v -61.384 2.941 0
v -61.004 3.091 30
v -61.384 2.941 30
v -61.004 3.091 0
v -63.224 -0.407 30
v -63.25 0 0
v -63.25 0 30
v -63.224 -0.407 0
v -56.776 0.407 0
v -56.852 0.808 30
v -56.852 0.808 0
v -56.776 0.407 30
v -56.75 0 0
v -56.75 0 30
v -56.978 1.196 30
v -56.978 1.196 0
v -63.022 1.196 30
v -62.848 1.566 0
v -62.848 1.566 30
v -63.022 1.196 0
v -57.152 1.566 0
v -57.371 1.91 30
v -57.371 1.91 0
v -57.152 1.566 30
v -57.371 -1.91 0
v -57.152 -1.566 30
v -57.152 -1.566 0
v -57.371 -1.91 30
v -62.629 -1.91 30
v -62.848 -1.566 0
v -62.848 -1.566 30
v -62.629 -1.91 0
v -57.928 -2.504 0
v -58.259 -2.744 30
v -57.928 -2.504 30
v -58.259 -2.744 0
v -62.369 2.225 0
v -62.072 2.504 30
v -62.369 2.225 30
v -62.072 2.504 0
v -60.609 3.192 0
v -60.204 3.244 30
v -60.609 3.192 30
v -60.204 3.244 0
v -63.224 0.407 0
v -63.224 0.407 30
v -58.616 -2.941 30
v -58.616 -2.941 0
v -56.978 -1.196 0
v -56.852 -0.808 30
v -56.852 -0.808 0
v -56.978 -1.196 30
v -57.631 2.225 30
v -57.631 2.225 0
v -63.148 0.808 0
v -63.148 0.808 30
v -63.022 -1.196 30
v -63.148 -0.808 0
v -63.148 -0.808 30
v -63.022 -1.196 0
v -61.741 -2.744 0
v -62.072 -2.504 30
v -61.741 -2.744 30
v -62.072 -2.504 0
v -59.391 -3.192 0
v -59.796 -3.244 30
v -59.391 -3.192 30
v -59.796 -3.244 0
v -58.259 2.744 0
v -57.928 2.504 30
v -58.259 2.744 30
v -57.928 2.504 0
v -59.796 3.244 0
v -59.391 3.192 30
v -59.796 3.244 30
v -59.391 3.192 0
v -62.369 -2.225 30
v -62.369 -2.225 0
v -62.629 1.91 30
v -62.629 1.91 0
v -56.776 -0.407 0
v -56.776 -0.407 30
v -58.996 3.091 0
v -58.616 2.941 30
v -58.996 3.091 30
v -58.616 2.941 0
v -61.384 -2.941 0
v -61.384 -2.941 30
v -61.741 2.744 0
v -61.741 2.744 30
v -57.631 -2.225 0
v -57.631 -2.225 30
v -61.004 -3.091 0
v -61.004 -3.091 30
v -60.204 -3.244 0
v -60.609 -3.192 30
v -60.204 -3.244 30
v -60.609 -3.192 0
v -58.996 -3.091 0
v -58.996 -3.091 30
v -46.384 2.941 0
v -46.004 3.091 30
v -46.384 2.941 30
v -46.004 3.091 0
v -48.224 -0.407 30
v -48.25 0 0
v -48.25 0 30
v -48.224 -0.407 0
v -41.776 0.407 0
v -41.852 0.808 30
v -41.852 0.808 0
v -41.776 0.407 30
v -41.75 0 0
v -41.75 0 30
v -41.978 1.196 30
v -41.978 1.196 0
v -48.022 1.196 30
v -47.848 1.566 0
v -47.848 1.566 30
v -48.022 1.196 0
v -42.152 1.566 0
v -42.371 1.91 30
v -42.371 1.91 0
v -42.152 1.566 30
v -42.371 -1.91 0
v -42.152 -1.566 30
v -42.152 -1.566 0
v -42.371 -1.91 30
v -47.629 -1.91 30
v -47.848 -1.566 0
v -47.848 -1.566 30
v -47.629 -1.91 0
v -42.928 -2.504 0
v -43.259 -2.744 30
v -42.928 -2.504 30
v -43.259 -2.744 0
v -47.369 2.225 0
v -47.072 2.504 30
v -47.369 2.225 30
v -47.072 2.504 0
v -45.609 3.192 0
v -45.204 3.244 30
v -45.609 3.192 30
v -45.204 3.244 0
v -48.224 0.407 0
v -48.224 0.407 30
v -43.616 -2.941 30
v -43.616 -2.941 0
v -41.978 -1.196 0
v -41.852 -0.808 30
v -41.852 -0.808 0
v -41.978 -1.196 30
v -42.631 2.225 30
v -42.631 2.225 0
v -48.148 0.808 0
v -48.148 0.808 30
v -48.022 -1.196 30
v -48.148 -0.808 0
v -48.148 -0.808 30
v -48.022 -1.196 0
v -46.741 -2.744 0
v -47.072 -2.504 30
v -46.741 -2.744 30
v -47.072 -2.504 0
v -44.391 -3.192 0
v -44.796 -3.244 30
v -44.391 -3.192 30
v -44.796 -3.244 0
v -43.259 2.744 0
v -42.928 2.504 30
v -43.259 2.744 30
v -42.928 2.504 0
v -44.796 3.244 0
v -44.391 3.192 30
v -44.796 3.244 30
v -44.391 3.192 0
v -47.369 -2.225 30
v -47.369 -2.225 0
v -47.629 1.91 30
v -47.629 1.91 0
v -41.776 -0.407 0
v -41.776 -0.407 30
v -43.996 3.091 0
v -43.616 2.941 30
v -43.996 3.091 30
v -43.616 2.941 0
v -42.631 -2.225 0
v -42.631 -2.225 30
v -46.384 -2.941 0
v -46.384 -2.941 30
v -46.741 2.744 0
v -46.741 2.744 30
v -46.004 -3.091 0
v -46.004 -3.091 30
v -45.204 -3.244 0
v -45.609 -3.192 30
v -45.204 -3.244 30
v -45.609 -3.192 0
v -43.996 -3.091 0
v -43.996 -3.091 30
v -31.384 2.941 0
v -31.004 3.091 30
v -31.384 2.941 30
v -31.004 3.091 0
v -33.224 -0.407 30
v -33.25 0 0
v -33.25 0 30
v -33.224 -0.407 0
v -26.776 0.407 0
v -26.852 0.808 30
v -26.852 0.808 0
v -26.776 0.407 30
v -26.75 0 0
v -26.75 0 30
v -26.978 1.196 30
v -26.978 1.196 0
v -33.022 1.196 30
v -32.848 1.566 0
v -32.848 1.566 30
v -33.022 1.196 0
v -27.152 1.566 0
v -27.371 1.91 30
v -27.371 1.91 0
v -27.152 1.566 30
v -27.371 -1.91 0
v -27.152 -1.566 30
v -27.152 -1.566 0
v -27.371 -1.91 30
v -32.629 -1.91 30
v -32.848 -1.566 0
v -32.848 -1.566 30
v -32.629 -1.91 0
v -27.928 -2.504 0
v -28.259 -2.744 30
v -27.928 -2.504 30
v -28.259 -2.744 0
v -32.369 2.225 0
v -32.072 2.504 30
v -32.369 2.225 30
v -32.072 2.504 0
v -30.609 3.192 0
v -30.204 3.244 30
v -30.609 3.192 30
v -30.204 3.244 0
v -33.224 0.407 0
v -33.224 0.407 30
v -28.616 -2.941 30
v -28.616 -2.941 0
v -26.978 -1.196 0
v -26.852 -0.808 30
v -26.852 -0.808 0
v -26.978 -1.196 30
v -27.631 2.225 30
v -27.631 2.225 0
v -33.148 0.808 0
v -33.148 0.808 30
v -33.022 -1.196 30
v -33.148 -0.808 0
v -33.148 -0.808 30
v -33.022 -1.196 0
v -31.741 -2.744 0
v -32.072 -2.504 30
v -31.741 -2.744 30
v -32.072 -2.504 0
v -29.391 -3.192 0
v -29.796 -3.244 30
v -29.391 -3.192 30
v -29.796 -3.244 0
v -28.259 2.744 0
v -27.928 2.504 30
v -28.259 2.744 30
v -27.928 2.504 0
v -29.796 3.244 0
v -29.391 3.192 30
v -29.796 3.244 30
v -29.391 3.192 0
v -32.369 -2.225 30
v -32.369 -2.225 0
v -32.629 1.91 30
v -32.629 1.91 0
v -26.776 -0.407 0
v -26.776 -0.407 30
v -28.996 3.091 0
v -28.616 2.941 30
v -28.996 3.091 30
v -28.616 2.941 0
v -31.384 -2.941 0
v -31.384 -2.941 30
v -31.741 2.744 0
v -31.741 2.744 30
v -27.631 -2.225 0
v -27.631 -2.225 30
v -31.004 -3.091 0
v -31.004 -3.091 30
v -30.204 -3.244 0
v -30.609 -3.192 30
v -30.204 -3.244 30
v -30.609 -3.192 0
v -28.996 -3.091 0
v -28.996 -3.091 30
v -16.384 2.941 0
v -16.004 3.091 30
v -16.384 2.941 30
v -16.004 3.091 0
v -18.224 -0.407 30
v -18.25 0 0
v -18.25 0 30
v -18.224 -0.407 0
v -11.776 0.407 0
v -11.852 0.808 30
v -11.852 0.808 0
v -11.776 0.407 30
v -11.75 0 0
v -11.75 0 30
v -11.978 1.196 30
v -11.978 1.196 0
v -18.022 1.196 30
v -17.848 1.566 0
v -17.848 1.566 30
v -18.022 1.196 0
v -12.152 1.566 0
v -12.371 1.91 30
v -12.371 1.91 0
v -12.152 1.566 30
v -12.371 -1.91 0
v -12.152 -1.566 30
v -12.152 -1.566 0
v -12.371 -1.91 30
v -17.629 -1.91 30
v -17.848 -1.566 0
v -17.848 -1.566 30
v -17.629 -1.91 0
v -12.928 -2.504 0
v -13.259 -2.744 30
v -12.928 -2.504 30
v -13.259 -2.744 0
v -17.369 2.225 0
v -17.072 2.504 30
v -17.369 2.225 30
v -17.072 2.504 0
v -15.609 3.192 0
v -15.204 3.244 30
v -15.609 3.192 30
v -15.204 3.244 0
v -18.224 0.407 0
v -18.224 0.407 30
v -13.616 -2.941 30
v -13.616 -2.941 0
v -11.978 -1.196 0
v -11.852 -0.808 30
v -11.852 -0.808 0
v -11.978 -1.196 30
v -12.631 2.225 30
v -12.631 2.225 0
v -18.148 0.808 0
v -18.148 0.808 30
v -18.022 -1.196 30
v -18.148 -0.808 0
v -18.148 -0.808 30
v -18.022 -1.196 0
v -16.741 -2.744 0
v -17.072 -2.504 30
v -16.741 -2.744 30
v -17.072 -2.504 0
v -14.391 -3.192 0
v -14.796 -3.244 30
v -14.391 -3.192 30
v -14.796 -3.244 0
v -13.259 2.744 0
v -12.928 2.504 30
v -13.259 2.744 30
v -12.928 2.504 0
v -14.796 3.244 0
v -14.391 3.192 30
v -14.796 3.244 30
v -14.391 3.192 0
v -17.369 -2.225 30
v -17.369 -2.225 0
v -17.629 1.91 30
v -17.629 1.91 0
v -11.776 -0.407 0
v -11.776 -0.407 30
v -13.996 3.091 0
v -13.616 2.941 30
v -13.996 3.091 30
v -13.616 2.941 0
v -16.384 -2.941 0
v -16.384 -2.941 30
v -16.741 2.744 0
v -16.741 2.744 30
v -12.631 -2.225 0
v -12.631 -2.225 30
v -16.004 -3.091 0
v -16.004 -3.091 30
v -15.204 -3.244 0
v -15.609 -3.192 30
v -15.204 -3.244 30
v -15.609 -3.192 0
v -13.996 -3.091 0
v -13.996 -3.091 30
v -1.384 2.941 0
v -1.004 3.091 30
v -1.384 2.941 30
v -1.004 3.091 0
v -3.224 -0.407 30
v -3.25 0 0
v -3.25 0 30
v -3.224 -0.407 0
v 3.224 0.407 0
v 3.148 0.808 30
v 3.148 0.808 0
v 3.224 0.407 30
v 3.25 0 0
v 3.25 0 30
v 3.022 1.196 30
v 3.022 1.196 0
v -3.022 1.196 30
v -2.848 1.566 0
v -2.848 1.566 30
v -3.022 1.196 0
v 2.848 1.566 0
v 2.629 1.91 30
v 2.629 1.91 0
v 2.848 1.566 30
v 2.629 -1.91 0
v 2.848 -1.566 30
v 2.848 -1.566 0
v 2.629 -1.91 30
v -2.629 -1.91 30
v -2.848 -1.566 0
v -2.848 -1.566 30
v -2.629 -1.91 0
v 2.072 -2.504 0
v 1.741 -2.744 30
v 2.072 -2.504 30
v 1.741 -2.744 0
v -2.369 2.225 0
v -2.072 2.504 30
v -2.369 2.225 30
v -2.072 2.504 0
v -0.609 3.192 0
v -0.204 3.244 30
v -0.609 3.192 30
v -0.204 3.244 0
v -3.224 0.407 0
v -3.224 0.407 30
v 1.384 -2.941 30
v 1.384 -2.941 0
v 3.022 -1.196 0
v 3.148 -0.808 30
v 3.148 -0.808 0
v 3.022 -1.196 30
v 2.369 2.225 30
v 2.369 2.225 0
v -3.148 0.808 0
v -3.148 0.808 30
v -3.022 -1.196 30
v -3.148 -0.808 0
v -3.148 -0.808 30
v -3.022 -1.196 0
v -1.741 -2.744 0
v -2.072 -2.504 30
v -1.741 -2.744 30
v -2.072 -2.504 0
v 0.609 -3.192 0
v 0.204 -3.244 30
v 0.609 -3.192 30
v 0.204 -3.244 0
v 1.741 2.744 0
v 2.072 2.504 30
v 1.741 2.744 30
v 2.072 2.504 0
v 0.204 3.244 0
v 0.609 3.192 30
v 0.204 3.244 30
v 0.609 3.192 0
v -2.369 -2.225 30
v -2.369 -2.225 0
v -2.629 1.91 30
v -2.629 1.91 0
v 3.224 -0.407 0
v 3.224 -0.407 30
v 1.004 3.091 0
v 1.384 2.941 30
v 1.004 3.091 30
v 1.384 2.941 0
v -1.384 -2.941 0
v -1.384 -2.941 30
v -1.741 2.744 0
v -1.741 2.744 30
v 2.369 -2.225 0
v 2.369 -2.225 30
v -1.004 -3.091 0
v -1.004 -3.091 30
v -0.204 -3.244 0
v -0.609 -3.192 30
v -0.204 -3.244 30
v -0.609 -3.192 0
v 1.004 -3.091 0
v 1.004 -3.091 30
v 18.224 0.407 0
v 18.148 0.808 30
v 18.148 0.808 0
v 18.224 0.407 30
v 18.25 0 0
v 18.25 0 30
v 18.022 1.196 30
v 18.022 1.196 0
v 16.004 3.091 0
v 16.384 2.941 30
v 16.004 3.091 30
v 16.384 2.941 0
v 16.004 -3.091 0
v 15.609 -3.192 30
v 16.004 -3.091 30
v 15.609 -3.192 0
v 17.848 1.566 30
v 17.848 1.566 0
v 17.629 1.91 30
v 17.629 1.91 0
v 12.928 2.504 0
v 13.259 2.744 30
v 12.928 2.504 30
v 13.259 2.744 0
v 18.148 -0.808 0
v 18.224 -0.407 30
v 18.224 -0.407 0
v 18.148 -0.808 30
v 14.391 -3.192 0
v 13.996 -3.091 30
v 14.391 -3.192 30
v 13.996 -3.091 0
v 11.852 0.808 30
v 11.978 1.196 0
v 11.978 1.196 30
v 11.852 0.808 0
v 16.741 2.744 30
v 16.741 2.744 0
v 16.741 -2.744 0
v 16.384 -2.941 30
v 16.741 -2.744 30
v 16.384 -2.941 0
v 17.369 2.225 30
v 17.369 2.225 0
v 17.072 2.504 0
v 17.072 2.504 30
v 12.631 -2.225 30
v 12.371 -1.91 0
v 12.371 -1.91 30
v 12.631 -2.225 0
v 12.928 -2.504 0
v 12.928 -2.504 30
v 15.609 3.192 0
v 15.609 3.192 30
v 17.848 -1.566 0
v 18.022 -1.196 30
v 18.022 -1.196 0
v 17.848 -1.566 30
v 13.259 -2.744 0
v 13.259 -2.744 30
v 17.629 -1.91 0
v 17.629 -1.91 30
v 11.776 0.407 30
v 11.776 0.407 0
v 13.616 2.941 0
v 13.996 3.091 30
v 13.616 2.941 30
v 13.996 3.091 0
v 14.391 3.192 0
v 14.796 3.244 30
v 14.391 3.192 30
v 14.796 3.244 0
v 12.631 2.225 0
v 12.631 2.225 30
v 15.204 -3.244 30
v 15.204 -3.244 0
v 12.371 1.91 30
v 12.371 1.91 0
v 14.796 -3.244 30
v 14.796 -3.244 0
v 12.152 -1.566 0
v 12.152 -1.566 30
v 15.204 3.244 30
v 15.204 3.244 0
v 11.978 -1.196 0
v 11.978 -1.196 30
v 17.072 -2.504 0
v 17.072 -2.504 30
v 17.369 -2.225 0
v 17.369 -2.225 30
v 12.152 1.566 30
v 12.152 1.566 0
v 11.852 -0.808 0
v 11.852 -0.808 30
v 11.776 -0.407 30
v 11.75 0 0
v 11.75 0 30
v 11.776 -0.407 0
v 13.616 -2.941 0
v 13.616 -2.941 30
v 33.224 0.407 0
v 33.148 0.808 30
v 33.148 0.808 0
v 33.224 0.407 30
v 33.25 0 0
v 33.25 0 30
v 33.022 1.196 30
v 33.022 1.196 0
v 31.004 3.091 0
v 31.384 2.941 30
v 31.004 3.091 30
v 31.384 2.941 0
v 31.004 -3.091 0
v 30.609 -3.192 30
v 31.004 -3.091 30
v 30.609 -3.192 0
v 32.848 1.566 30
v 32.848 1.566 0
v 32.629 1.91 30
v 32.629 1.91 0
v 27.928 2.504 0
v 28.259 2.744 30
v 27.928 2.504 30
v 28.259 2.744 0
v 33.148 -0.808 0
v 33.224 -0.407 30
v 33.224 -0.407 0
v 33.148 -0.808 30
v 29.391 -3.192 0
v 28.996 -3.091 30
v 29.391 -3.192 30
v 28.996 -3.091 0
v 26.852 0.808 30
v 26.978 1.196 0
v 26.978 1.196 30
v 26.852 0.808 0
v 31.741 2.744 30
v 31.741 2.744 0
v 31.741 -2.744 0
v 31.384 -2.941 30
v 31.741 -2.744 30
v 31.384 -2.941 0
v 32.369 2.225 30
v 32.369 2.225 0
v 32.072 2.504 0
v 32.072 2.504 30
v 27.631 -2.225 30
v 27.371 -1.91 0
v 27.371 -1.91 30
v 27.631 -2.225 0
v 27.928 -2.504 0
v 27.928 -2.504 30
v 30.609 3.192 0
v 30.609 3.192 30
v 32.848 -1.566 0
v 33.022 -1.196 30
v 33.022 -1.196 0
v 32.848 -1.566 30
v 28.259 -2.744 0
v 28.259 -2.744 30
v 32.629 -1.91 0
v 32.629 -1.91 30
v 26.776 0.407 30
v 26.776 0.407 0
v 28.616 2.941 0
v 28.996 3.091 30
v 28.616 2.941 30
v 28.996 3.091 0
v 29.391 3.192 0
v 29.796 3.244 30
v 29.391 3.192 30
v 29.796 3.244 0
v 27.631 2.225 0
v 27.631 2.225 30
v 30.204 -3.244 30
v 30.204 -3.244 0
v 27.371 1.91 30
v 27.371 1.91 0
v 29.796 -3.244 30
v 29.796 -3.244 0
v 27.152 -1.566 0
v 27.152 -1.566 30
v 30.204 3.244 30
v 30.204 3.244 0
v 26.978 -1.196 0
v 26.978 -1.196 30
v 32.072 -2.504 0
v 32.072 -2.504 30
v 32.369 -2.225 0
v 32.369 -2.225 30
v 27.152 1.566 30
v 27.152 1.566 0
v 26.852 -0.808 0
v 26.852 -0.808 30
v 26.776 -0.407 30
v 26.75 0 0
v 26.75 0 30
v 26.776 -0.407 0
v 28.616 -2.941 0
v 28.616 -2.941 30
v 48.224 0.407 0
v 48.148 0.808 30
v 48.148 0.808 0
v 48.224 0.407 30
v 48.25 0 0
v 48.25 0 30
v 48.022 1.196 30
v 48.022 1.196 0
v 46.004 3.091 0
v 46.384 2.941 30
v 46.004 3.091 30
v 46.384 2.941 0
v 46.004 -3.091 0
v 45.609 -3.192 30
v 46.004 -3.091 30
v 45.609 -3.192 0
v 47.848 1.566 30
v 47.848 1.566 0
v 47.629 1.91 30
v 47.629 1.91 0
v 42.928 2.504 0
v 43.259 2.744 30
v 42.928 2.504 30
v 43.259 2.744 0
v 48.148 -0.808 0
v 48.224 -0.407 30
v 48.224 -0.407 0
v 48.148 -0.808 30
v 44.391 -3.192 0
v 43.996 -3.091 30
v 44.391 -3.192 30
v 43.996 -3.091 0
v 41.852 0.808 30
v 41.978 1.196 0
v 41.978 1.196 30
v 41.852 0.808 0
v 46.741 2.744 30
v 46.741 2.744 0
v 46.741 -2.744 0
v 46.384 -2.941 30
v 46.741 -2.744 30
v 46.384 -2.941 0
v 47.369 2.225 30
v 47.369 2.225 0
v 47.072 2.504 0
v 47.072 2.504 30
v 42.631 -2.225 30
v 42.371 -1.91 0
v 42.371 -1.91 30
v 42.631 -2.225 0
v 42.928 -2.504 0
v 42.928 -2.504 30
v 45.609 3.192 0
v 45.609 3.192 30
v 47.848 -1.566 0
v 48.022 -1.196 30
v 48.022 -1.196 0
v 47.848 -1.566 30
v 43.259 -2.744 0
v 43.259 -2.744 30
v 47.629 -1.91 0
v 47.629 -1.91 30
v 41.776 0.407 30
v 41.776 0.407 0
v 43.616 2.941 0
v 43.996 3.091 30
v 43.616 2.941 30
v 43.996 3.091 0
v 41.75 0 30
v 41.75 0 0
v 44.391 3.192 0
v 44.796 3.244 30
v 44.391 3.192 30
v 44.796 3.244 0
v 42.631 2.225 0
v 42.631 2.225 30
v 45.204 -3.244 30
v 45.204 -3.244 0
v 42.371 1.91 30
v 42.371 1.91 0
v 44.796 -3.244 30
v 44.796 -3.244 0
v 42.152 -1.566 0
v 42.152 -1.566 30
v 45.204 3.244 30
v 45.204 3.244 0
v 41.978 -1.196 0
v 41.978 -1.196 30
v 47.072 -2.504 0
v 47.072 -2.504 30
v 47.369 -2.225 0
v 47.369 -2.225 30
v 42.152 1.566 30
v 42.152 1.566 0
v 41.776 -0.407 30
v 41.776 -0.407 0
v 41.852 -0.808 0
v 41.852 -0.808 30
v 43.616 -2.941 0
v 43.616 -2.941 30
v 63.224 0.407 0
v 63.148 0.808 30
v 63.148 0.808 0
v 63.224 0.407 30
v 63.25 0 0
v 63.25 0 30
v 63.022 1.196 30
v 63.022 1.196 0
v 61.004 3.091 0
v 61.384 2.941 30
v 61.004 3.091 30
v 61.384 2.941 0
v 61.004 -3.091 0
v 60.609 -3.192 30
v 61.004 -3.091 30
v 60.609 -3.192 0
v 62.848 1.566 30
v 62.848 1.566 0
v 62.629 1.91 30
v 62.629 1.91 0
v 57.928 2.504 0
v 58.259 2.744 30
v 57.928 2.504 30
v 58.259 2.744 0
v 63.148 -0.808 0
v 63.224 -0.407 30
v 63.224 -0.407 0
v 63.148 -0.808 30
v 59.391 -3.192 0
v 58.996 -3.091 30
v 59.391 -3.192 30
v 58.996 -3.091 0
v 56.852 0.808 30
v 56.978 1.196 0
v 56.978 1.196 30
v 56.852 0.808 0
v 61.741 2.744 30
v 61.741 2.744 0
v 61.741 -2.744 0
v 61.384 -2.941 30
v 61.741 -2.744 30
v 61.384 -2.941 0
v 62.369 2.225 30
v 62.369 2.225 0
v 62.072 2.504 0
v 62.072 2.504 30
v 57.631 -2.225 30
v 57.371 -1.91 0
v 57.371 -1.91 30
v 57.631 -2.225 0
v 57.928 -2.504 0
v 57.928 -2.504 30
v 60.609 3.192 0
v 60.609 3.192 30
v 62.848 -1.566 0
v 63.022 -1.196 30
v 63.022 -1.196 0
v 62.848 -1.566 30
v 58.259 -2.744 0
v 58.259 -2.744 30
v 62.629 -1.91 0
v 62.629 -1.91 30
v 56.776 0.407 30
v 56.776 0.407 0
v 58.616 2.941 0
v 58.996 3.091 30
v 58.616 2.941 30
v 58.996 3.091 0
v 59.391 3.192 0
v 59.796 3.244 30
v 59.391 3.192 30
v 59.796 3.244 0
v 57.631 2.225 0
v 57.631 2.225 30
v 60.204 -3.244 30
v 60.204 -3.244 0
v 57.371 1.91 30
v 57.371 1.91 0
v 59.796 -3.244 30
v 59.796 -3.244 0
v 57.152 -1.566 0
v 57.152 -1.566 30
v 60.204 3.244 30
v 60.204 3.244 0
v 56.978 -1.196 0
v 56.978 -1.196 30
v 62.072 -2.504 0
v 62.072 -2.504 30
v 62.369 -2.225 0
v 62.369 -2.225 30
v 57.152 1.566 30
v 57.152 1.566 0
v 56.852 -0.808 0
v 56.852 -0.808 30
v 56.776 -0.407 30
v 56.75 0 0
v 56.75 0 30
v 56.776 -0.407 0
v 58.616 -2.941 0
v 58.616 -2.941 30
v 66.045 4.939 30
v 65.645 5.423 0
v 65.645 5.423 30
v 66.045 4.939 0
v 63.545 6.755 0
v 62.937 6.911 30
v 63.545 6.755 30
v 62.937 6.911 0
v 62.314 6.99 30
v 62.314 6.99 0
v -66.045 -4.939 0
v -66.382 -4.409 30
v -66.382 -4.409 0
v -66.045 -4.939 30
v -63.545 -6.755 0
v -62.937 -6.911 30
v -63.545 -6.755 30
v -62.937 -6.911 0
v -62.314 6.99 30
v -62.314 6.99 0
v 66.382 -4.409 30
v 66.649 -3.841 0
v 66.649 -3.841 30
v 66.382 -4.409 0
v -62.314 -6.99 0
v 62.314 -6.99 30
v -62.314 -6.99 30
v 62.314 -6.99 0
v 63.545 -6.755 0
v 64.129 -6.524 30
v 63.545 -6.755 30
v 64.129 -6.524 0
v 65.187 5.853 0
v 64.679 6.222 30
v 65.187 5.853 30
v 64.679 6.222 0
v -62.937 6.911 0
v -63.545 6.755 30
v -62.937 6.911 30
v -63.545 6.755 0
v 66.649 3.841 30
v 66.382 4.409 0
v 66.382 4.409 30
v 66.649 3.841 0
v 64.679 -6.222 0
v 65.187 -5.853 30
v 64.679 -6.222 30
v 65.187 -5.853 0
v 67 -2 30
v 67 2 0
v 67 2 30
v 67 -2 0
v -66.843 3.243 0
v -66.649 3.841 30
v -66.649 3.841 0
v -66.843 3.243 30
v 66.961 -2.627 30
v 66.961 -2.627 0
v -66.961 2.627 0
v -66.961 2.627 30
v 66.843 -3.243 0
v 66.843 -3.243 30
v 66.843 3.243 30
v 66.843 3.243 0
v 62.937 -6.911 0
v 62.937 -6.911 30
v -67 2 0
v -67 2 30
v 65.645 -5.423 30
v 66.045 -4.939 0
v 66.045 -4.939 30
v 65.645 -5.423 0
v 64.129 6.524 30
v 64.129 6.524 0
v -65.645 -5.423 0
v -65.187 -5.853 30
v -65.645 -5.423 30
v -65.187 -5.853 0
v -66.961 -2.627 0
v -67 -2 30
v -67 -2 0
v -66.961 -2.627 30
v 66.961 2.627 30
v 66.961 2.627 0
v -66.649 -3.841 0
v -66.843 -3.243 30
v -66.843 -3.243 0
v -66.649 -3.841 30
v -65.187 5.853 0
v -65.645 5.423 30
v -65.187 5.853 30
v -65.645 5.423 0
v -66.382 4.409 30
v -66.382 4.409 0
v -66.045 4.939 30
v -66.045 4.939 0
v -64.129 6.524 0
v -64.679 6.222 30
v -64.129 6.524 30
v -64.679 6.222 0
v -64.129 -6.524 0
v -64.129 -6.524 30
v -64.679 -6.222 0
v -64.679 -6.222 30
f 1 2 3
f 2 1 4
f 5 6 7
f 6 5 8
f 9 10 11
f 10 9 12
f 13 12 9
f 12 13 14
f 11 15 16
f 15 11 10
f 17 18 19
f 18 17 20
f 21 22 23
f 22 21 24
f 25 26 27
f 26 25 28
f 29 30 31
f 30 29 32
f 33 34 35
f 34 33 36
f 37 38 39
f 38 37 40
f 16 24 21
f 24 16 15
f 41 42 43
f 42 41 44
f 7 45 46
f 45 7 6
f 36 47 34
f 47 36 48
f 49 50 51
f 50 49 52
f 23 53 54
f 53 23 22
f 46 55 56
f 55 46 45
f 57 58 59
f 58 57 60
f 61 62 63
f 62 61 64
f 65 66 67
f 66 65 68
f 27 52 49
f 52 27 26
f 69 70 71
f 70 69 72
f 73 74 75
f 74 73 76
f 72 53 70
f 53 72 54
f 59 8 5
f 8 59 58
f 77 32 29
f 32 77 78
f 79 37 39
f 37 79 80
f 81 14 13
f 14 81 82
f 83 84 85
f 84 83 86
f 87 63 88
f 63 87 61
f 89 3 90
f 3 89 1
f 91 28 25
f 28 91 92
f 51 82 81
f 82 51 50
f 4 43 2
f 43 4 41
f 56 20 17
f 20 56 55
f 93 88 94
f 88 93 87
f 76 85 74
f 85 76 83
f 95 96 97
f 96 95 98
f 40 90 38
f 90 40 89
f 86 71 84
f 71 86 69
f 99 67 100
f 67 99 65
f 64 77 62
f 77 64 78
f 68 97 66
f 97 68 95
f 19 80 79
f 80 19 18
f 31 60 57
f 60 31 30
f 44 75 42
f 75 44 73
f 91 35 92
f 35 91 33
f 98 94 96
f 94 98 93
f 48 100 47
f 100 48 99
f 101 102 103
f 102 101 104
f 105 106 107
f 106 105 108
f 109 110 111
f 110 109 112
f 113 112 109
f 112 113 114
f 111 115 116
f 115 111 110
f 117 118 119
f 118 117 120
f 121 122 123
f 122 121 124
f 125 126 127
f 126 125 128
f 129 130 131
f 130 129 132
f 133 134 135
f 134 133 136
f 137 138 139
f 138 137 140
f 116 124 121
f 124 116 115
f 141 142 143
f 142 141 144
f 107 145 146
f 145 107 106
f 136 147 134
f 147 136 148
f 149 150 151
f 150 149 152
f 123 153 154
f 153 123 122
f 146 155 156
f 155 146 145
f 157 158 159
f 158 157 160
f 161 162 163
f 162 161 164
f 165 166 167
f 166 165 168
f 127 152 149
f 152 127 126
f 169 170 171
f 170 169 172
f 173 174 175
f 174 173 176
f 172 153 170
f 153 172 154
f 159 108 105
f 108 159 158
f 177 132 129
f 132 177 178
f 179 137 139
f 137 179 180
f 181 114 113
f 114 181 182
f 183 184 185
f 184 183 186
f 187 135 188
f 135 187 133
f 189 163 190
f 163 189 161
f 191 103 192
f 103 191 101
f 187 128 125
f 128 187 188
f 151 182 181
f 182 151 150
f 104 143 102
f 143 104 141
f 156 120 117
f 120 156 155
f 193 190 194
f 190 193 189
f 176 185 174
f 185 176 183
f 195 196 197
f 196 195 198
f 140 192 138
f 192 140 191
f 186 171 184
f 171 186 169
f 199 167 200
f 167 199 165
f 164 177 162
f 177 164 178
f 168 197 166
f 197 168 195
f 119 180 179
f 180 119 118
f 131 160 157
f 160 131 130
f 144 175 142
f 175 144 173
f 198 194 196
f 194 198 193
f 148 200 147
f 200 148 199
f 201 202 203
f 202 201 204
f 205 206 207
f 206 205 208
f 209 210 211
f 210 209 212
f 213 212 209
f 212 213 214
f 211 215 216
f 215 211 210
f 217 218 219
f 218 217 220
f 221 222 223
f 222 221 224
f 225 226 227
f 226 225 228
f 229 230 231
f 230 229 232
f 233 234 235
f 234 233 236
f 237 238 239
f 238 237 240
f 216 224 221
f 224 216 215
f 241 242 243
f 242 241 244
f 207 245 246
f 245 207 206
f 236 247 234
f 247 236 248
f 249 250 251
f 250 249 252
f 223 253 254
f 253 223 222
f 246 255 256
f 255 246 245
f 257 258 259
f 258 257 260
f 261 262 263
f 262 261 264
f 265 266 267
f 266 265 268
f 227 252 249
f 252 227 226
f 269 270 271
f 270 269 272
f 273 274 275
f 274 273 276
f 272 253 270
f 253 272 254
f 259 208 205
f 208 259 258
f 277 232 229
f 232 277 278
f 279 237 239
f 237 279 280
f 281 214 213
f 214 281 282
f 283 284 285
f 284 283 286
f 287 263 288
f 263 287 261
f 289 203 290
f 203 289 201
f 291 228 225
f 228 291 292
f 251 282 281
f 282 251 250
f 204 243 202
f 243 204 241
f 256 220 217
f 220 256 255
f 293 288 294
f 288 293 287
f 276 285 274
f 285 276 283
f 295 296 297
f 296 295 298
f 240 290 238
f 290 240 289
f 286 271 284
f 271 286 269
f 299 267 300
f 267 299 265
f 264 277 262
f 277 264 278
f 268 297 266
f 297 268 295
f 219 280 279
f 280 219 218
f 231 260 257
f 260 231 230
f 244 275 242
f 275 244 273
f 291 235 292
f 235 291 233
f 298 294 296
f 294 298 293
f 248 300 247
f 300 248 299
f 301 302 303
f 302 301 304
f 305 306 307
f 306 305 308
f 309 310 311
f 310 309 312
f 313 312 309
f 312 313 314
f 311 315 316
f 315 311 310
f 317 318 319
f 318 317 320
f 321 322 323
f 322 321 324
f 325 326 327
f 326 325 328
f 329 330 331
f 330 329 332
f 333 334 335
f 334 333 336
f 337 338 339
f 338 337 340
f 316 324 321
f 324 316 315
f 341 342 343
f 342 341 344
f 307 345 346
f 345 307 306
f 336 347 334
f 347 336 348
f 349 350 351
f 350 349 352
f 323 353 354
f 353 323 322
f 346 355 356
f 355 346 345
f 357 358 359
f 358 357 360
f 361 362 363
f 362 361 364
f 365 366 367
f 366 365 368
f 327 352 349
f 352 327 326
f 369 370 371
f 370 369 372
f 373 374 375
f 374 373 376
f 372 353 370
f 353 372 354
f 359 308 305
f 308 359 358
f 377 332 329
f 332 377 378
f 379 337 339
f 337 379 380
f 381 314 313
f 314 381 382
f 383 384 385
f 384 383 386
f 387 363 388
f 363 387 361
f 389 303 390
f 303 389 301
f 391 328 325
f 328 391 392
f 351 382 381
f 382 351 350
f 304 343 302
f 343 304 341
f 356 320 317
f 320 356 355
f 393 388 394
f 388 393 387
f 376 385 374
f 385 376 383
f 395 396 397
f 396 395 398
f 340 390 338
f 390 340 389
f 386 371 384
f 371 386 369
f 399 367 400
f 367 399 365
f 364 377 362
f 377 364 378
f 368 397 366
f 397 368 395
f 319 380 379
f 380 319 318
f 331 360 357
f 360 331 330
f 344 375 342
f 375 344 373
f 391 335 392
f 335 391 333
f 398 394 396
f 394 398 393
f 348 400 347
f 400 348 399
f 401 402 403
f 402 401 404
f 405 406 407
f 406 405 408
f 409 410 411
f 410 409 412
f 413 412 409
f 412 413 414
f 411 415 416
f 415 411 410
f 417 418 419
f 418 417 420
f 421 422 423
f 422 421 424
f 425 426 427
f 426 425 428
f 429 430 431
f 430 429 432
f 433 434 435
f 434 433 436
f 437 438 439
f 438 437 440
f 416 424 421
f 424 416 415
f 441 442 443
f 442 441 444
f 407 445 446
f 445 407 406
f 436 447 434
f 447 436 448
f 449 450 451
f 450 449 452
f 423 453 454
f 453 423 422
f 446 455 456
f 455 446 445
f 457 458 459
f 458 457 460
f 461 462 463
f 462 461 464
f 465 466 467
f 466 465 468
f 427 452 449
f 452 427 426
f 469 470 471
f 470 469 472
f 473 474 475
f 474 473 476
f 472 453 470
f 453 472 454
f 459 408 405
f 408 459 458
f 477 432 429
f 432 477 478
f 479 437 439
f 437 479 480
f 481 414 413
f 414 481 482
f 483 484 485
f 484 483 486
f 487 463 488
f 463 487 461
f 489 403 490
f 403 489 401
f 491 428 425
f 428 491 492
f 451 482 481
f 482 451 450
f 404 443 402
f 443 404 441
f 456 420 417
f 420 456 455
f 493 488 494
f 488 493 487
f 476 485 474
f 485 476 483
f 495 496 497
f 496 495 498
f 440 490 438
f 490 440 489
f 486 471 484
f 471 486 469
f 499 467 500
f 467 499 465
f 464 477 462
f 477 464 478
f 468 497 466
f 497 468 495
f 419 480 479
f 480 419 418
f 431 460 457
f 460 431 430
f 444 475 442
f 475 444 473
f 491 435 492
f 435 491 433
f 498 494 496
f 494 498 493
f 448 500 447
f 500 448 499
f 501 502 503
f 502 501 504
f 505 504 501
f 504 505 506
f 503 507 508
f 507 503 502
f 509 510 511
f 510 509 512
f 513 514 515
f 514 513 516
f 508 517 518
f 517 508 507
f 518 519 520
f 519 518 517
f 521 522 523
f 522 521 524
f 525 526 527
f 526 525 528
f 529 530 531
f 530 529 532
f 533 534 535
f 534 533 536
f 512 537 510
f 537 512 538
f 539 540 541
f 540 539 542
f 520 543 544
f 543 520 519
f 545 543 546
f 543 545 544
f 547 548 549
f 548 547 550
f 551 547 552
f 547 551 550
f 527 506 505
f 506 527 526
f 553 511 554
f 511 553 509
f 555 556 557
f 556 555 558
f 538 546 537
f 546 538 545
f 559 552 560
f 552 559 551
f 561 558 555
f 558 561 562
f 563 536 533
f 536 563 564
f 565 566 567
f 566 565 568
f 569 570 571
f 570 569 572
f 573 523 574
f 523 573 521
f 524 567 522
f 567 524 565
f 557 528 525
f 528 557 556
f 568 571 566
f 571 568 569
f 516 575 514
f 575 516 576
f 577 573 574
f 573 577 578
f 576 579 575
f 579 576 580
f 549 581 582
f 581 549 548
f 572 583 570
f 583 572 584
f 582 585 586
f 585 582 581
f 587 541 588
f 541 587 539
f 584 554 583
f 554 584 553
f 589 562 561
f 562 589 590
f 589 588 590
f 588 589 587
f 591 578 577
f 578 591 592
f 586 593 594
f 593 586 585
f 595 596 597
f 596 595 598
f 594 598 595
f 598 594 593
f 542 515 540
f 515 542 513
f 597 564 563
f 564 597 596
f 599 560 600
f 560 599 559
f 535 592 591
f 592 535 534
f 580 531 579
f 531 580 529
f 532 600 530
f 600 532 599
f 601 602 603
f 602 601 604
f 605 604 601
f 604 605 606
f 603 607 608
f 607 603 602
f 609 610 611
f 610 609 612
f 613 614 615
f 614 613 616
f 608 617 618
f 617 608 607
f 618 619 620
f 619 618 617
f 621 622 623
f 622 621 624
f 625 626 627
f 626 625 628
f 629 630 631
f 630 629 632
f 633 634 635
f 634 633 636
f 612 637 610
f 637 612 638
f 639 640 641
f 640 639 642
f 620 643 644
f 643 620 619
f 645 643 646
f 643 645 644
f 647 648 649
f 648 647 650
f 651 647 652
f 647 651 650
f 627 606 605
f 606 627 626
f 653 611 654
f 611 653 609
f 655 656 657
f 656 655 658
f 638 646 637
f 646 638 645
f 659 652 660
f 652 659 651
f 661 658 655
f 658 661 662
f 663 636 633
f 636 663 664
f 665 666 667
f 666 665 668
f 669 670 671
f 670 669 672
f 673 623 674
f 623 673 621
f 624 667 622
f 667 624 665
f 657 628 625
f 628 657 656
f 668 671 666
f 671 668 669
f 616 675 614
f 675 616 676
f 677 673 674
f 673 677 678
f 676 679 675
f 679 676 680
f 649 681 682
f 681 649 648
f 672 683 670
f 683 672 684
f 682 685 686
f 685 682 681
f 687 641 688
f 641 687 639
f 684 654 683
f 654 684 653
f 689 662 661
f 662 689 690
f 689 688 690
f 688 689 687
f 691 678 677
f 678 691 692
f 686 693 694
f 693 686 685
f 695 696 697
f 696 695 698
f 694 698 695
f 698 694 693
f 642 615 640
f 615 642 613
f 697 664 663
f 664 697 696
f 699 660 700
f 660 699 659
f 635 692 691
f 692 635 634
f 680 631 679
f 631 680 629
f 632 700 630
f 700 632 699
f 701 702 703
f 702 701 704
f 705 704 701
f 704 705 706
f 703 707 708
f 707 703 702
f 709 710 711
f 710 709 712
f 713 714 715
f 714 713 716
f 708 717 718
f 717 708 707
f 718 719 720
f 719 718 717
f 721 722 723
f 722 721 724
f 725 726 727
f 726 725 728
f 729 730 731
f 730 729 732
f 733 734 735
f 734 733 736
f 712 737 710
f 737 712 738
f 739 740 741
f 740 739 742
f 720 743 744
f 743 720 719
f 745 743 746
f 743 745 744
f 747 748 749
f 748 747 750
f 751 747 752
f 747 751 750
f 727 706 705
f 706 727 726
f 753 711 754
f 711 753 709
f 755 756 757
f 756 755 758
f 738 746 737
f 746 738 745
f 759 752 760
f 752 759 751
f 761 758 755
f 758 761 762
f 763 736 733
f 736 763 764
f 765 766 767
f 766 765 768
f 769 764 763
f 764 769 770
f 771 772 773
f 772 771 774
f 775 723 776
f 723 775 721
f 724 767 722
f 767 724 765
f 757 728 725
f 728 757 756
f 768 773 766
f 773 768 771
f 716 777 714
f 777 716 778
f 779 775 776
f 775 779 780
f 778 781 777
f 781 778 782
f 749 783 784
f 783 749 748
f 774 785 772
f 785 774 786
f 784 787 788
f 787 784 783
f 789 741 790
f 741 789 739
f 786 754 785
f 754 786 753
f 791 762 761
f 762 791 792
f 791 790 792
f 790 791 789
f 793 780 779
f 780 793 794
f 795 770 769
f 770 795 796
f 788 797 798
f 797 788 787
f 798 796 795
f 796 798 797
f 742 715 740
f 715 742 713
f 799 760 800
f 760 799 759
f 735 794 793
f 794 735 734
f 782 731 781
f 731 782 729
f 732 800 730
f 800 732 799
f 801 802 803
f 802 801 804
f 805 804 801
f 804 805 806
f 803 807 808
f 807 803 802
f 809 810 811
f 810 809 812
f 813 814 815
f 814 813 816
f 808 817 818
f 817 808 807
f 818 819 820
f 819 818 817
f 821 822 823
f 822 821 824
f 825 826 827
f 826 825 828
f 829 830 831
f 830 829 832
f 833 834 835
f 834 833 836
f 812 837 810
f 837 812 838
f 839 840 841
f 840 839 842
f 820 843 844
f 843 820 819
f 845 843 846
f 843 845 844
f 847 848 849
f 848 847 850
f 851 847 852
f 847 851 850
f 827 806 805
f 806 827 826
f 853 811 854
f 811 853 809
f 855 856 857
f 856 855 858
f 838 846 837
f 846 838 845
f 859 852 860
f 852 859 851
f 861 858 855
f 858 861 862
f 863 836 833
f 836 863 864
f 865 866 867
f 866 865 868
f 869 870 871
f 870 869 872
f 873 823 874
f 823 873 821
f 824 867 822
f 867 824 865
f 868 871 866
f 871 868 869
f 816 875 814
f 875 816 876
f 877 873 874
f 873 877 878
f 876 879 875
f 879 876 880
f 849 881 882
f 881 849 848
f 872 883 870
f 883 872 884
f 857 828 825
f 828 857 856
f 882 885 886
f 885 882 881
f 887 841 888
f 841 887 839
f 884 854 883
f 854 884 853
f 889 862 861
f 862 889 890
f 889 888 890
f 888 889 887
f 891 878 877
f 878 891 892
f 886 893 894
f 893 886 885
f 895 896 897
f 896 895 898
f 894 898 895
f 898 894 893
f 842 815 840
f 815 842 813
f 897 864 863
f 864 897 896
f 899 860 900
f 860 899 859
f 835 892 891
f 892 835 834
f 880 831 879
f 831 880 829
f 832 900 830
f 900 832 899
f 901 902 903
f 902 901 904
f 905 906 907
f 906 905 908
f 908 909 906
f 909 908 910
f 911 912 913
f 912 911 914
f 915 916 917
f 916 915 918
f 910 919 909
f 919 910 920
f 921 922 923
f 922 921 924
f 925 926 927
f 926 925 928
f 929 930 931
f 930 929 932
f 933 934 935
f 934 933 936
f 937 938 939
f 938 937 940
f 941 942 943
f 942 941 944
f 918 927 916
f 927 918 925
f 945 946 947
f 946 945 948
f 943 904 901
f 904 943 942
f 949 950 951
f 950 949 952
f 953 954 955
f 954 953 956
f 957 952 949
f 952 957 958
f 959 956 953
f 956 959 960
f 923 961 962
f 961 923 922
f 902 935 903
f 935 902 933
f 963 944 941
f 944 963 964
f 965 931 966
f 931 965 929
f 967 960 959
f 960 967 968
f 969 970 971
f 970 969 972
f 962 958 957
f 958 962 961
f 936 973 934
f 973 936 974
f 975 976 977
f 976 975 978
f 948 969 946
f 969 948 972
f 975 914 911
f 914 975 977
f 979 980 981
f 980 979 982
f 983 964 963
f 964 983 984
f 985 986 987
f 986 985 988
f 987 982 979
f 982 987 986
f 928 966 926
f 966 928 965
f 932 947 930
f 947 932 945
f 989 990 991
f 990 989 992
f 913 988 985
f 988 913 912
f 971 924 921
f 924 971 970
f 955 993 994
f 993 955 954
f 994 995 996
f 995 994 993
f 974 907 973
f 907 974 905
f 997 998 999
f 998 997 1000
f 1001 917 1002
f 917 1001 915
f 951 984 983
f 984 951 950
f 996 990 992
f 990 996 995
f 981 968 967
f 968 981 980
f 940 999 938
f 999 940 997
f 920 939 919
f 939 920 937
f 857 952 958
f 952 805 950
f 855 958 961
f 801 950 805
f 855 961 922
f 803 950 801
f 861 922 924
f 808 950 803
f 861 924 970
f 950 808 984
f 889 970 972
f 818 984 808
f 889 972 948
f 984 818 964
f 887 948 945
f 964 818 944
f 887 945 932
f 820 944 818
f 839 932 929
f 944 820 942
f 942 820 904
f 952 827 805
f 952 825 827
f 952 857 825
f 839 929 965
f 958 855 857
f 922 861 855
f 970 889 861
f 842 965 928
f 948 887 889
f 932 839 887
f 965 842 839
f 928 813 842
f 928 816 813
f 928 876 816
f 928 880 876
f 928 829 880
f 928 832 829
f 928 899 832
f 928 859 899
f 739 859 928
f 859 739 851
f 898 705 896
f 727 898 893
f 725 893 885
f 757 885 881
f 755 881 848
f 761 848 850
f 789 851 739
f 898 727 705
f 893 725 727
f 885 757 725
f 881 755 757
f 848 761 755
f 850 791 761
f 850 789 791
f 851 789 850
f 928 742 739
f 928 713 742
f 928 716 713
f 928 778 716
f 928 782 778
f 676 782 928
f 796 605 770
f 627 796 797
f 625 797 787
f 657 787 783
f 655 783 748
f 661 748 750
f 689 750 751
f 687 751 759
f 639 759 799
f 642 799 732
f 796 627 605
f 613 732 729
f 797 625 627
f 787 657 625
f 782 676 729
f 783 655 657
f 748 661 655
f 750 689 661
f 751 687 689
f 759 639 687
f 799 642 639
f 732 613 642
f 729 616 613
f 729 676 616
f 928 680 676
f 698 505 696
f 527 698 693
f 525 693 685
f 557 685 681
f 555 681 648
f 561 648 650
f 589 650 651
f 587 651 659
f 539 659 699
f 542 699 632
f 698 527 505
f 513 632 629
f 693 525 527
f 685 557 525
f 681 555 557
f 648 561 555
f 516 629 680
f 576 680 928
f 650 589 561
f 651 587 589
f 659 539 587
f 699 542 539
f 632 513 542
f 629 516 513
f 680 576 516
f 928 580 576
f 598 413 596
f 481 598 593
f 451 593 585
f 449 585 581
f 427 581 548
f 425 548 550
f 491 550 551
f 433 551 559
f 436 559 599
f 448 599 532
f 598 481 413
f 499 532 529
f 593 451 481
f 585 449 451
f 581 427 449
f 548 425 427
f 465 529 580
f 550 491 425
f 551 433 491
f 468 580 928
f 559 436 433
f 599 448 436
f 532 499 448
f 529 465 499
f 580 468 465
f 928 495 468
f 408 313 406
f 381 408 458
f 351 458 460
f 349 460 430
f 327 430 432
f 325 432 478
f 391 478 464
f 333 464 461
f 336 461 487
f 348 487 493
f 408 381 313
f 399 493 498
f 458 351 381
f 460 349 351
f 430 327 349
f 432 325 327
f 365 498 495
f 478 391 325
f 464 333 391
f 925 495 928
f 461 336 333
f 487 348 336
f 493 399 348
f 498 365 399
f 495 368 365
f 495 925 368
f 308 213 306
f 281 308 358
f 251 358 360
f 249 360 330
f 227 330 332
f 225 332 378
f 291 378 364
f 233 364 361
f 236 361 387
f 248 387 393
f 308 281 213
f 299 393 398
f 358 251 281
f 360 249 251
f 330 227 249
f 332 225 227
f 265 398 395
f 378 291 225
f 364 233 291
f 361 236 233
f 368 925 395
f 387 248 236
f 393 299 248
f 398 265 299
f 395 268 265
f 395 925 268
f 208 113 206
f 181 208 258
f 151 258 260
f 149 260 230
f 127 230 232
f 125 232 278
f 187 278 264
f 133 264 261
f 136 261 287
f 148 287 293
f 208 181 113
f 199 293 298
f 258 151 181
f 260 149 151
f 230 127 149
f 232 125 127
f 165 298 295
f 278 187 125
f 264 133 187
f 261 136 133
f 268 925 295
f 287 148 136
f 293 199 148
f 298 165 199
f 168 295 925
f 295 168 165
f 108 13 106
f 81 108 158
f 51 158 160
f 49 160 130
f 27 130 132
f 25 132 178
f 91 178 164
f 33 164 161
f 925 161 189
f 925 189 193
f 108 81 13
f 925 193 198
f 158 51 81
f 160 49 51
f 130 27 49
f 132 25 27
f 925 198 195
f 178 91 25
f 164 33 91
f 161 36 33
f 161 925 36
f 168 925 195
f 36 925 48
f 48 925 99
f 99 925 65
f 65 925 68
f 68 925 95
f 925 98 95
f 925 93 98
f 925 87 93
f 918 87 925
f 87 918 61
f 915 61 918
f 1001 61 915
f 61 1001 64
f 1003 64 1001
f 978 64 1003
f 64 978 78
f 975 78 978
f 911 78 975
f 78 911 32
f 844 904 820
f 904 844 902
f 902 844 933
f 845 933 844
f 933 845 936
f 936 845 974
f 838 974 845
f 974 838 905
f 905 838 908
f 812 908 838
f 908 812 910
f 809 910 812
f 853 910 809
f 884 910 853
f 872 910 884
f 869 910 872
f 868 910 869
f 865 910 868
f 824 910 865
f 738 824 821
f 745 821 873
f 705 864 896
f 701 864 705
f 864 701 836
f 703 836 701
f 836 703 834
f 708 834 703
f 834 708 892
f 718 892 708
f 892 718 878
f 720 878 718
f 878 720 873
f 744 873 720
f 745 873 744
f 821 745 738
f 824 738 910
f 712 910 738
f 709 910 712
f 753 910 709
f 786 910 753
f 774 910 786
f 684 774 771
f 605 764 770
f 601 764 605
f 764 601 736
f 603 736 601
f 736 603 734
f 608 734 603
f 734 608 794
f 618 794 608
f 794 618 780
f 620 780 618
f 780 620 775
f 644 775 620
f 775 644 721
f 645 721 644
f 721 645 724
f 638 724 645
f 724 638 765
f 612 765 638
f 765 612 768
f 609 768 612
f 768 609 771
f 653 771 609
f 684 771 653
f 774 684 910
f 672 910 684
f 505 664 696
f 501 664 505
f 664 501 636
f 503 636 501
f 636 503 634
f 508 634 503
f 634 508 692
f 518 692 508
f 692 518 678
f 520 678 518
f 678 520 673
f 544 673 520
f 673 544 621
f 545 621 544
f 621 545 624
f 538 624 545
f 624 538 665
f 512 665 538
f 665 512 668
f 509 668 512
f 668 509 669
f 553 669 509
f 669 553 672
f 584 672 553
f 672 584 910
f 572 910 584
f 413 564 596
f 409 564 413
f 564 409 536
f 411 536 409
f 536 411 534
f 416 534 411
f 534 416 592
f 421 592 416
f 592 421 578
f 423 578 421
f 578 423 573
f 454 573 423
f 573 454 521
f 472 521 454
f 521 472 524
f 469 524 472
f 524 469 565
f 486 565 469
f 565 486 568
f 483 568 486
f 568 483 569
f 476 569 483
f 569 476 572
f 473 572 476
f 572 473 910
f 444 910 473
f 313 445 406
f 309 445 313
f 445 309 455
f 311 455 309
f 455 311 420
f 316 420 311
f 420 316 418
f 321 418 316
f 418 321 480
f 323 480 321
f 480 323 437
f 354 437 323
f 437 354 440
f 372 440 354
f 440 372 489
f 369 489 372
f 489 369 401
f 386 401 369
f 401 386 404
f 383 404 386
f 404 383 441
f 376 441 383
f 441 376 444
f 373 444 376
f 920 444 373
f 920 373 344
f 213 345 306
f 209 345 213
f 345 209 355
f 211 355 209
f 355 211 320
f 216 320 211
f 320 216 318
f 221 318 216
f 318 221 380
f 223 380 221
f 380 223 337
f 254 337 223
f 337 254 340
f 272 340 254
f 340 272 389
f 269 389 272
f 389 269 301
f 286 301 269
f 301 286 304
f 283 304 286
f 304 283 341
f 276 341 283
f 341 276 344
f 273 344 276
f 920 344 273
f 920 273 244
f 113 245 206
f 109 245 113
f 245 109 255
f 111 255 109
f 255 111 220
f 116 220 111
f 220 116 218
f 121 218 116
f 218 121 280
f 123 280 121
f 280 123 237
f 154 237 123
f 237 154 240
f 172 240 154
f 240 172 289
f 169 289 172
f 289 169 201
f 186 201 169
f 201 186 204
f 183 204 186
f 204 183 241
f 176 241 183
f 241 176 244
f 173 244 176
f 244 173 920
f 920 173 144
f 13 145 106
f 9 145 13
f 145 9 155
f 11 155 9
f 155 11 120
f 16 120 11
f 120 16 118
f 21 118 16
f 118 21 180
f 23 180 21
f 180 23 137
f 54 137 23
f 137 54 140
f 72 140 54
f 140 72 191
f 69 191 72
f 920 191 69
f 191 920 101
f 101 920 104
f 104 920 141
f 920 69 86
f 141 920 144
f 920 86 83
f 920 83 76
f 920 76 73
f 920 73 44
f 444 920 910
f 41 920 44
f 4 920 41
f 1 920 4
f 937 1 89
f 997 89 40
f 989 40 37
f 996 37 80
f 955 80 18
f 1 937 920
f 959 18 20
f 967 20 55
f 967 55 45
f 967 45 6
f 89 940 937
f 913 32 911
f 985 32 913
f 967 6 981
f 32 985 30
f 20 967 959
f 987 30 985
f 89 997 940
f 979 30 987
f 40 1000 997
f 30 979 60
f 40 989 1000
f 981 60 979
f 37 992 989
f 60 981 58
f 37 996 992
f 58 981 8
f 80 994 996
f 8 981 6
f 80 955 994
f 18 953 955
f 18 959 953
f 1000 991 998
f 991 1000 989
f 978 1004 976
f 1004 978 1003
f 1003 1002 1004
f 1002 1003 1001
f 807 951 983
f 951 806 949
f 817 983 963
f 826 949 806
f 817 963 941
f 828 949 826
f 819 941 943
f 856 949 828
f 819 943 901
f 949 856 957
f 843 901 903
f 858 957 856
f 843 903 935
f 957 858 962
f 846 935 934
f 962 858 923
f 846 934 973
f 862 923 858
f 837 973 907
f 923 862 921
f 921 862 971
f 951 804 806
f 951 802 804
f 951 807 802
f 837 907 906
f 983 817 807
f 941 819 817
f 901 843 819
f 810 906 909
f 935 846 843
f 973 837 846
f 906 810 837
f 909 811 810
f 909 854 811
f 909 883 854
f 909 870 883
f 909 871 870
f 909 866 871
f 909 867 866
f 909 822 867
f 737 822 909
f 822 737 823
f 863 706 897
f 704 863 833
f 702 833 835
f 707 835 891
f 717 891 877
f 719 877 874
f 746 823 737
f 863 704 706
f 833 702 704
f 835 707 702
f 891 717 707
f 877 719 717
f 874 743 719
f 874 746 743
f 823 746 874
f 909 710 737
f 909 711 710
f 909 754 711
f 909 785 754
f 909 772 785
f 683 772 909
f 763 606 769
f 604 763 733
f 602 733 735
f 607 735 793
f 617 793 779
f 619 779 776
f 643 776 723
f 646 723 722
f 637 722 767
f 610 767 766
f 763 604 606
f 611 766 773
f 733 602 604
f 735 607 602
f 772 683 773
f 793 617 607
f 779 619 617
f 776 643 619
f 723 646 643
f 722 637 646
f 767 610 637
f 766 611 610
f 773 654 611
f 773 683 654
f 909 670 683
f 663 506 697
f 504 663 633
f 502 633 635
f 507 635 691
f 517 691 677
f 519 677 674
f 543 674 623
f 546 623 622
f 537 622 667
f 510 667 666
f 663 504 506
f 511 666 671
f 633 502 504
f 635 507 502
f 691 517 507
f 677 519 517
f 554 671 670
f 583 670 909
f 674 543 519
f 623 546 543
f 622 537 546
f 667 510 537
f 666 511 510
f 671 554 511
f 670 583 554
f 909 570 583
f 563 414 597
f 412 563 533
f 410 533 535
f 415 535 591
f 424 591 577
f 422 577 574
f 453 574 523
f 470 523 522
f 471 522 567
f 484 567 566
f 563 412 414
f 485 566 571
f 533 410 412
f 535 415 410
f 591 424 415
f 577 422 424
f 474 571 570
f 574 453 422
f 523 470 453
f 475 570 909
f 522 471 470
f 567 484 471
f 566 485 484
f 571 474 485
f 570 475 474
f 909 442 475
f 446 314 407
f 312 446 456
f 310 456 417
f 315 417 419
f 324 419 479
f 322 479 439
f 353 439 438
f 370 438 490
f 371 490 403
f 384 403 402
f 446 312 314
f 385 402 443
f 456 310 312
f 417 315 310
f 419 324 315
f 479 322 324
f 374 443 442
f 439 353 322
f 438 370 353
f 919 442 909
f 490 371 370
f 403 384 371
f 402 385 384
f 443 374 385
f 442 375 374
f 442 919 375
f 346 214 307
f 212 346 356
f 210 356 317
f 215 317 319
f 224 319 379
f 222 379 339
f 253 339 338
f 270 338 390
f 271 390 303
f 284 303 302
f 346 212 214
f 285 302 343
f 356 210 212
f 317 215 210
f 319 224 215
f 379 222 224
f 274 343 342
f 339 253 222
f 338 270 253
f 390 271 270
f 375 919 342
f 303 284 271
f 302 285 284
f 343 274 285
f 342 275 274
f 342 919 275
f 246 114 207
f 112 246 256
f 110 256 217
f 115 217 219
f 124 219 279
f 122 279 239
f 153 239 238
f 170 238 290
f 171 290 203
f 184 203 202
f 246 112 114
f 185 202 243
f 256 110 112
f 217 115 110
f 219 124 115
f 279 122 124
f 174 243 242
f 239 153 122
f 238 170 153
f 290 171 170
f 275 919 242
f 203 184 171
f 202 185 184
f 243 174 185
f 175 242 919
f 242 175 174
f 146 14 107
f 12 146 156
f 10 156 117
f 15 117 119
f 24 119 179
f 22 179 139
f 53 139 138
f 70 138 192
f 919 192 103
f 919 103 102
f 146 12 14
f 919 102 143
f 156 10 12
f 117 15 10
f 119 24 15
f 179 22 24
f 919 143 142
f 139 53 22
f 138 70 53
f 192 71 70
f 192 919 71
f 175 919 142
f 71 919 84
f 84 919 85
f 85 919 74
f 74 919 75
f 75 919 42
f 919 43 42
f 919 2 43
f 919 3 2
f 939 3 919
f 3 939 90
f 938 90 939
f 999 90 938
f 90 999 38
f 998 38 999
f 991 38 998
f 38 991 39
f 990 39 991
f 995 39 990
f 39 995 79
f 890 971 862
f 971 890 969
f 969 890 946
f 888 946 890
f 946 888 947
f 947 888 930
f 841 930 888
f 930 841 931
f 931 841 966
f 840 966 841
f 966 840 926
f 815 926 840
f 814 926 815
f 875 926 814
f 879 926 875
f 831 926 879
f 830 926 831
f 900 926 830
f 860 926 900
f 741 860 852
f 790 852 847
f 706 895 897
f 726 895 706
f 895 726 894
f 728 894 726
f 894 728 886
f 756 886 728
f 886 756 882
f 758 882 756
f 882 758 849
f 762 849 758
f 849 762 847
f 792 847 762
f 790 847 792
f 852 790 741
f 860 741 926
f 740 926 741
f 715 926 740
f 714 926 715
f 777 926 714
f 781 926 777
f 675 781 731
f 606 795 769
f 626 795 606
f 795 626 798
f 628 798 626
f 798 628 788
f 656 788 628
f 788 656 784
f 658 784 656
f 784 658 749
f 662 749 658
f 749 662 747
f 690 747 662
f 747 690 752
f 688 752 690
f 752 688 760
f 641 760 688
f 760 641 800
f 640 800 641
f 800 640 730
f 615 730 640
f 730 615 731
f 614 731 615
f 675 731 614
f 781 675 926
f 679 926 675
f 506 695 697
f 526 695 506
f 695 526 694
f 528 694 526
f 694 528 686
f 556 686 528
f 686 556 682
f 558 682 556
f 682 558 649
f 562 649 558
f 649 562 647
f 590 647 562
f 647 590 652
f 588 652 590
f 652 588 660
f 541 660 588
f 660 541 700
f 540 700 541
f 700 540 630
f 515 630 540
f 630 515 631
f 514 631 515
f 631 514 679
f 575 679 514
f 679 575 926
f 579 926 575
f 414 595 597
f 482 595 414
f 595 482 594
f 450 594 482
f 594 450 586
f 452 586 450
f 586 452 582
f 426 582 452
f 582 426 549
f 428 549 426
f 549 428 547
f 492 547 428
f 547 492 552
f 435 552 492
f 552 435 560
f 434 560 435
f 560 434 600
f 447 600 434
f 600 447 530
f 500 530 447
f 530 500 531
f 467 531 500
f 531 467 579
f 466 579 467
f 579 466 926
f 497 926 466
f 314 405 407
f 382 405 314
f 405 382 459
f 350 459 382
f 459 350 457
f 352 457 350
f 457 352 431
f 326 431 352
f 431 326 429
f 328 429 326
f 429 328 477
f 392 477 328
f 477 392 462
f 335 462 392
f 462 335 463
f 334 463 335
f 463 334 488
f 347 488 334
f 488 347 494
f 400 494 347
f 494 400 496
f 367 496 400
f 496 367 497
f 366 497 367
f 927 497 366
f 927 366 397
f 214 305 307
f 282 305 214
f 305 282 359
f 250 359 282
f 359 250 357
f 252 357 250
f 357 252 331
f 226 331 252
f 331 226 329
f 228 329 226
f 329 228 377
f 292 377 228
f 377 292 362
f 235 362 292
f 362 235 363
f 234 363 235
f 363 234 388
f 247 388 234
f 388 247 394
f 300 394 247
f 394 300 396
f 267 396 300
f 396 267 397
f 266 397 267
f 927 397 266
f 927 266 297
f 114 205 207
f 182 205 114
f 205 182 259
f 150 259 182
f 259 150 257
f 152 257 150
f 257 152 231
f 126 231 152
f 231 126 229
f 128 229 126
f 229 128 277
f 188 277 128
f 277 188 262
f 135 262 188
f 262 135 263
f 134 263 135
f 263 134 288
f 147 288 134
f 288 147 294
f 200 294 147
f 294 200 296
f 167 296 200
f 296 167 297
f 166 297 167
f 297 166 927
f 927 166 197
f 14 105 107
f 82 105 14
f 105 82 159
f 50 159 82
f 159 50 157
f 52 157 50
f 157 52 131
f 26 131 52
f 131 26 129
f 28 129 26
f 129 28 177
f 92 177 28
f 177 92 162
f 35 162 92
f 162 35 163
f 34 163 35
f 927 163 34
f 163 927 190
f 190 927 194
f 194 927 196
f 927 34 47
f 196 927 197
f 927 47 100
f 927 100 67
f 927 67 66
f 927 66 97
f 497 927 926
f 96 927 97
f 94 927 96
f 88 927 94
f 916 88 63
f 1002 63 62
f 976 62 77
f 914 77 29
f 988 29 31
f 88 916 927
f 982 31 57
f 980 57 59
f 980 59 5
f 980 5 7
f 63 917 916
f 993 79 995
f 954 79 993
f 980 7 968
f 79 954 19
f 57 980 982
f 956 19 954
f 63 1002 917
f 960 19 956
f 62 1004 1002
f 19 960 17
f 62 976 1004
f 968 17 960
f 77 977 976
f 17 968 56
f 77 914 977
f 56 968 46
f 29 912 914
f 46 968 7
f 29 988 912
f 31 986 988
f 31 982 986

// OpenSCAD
$fn = 50;


difference() {
	union() {
		hull() {
			translate(v = [-62.0000000000, 2.0000000000, 0]) {
				cylinder(h = 30, r = 5);
			}
			translate(v = [62.0000000000, 2.0000000000, 0]) {
				cylinder(h = 30, r = 5);
			}
			translate(v = [-62.0000000000, -2.0000000000, 0]) {
				cylinder(h = 30, r = 5);
			}
			translate(v = [62.0000000000, -2.0000000000, 0]) {
				cylinder(h = 30, r = 5);
			}
		}
	}
	union() {
		translate(v = [-60.0000000000, 0.0000000000, -100.0000000000]) {
			cylinder(h = 200, r = 3.2500000000);
		}
		translate(v = [-45.0000000000, 0.0000000000, -100.0000000000]) {
			cylinder(h = 200, r = 3.2500000000);
		}
		translate(v = [-30.0000000000, 0.0000000000, -100.0000000000]) {
			cylinder(h = 200, r = 3.2500000000);
		}
		translate(v = [-15.0000000000, 0.0000000000, -100.0000000000]) {
			cylinder(h = 200, r = 3.2500000000);
		}
		translate(v = [0.0000000000, 0.0000000000, -100.0000000000]) {
			cylinder(h = 200, r = 3.2500000000);
		}
		translate(v = [15.0000000000, 0.0000000000, -100.0000000000]) {
			cylinder(h = 200, r = 3.2500000000);
		}
		translate(v = [30.0000000000, 0.0000000000, -100.0000000000]) {
			cylinder(h = 200, r = 3.2500000000);
		}
		translate(v = [45.0000000000, 0.0000000000, -100.0000000000]) {
			cylinder(h = 200, r = 3.2500000000);
		}
		translate(v = [60.0000000000, 0.0000000000, -100.0000000000]) {
			cylinder(h = 200, r = 3.2500000000);
		}
	}
}
